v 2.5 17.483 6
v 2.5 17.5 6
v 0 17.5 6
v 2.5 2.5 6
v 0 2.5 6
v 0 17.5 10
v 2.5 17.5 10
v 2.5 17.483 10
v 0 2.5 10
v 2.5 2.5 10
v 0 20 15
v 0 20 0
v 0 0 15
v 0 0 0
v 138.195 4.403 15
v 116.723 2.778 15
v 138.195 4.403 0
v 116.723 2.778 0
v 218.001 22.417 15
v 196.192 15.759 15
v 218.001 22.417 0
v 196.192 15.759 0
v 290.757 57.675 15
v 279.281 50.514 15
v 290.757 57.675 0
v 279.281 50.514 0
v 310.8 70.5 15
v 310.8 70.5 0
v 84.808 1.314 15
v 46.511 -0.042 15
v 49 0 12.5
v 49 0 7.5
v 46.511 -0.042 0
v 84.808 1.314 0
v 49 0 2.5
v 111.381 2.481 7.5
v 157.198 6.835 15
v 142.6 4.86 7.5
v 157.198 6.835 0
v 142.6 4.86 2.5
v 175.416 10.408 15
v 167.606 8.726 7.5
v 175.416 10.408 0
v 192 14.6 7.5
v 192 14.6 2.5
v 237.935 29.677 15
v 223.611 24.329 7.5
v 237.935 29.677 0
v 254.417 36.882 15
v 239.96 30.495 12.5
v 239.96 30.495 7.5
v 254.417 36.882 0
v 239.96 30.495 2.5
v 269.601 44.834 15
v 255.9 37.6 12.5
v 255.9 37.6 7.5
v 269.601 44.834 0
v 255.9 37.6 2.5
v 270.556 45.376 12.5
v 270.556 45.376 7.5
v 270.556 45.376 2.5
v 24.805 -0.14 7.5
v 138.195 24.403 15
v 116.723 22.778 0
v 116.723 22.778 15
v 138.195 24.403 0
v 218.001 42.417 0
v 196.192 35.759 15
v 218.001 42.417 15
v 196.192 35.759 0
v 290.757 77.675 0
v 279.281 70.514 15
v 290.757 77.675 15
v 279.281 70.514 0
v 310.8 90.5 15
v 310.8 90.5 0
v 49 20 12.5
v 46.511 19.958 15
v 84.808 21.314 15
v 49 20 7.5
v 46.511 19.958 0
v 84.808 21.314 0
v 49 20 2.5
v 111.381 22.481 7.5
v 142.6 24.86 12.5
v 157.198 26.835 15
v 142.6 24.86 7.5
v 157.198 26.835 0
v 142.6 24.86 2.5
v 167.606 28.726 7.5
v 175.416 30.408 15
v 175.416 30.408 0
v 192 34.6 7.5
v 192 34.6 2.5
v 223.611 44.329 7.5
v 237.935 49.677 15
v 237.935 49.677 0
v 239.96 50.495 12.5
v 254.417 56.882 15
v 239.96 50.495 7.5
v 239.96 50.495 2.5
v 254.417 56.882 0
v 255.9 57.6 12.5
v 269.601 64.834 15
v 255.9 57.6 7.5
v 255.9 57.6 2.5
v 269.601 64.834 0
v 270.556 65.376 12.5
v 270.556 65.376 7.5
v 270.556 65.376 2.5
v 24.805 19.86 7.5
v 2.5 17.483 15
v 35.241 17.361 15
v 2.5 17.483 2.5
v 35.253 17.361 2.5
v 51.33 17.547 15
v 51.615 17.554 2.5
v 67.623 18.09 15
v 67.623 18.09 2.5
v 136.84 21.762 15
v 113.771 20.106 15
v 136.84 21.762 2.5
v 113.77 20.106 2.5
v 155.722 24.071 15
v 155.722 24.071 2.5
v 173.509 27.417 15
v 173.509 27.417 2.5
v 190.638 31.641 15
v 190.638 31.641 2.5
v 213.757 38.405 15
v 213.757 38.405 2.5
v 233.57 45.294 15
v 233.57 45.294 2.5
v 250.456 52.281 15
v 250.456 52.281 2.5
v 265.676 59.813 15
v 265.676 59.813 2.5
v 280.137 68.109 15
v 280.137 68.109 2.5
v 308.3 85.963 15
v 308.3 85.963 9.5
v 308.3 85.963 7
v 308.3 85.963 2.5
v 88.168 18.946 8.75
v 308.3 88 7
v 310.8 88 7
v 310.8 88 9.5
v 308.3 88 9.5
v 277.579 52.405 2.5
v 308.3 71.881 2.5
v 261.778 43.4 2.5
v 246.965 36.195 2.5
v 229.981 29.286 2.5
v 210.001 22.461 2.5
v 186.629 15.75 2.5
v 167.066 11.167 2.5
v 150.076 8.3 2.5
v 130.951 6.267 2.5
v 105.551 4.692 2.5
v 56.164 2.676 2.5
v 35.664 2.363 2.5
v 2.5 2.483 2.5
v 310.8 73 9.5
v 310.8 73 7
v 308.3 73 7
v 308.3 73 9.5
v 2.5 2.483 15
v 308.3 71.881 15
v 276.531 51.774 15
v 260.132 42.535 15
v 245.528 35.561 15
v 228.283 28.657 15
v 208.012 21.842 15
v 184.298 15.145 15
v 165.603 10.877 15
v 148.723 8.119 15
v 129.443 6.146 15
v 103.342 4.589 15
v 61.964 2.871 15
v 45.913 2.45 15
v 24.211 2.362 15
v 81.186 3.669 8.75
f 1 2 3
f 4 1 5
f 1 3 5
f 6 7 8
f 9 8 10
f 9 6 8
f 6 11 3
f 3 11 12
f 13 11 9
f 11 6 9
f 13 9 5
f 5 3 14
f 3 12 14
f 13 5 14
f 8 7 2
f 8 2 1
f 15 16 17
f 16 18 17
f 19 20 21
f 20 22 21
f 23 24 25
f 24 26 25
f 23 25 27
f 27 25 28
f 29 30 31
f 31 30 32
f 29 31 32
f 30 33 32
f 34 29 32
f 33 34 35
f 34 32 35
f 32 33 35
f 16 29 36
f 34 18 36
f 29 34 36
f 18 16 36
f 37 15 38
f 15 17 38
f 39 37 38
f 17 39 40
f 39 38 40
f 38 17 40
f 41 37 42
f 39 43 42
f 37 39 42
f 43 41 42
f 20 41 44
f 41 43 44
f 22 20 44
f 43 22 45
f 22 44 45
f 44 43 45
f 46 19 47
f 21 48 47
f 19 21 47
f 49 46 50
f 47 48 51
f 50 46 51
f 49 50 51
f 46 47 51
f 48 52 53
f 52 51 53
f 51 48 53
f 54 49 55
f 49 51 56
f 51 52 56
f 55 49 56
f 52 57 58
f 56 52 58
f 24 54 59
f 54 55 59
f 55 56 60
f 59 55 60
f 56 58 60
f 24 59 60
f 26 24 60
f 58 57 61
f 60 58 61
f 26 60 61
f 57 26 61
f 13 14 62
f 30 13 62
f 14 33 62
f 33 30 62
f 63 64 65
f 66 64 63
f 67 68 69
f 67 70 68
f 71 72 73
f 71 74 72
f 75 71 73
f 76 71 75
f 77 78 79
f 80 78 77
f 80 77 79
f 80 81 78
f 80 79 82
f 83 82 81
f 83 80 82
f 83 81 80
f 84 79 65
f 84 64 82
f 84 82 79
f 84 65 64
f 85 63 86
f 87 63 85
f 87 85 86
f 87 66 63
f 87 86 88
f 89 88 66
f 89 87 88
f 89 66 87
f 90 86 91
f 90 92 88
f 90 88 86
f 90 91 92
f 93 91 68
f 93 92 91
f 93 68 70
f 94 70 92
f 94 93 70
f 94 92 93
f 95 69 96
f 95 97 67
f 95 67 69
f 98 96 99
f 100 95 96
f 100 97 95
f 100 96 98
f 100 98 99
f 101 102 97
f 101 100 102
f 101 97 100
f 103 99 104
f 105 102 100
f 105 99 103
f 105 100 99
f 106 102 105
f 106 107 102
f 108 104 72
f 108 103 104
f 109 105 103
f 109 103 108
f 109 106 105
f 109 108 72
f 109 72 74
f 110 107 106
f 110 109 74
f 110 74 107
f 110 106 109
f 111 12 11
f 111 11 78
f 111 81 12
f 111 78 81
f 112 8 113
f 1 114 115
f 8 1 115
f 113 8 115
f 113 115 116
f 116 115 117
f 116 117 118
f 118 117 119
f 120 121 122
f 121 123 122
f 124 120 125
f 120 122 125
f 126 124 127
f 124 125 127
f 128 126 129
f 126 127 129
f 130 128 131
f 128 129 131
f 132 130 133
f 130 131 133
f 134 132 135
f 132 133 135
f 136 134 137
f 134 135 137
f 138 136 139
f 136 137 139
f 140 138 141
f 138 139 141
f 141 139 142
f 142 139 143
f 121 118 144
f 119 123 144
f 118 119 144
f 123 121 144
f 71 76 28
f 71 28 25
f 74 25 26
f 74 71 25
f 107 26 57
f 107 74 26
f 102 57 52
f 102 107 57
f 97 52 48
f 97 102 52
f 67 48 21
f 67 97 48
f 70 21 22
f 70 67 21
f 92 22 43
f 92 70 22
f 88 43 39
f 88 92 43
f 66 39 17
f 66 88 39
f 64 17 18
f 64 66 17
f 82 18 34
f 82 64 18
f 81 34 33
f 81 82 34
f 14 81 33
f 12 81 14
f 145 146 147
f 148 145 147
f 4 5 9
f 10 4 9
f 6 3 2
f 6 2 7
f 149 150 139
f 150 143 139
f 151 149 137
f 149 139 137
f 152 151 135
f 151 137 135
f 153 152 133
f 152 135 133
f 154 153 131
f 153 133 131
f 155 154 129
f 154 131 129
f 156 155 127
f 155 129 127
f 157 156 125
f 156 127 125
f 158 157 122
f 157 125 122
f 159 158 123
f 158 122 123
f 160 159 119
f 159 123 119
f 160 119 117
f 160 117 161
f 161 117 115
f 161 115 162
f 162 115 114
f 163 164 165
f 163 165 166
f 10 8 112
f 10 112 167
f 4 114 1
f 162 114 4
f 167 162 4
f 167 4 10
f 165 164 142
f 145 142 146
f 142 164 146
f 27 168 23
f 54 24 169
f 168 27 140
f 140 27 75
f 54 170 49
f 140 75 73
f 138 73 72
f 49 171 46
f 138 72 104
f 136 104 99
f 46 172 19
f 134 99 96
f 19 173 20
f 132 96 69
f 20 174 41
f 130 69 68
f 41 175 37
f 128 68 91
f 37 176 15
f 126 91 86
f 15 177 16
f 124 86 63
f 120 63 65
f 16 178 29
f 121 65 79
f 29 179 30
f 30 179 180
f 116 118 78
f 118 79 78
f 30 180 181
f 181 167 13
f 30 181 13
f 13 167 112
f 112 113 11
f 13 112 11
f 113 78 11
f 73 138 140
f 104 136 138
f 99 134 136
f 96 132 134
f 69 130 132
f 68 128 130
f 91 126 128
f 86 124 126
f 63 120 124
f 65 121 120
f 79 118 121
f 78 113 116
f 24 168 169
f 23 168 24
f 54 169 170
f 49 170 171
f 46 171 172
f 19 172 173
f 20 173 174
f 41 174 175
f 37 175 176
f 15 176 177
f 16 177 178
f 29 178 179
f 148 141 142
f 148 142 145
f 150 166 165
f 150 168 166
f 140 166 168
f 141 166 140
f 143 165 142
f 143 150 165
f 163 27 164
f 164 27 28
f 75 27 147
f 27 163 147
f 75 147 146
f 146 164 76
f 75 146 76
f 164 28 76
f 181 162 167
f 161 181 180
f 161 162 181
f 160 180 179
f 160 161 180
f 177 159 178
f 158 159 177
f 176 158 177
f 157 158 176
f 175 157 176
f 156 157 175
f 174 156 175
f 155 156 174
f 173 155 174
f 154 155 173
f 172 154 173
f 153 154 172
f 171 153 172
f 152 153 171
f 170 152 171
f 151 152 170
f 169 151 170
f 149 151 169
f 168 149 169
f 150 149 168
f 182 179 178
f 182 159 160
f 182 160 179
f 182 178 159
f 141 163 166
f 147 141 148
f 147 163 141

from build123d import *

# Parameters (mm, degrees)
F1_DEPTH = 15
F2_T     = -2.5
F3_W     = 15
F3_H     = 4
F4_DEPTH = 2.5
F5_W     = 15
F5_H     = 2.5
F6_DEPTH = 2.5


with BuildPart() as f1:
    # F0 (on Top) → F1 (new body)
    with BuildSketch(Plane.XY):
        with BuildLine():
            add(Edge.make_bspline(
                [(0, 20), (18.4547170081, 19.8746186243), (49.1586302486, 19.6363824376), (81.651485284, 21.3203627116), (144.6164509178, 23.4125982049), (191.7138925015, 33.5667046191), (257.8451763383, 54.7310576595), (293.6638137306, 79.7551524216), (310.8, 90.5)],
                knots=[0, 0, 0, 0, 0.159543607, 0.2905166174, 0.4681043654, 0.6298325102, 0.8176597752, 1, 1, 1, 1], degree=3))
            Line((0, 20), (0, 0))
            add(Edge.make_bspline(
                [(0, 0), (18.4547170081, -0.1253813757), (49.1586302486, -0.3636175624), (81.651485284, 1.3203627116), (144.6164509178, 3.4125982049), (191.7138925015, 13.5667046191), (257.8451763383, 34.7310576595), (293.6638137306, 59.7551524216), (310.8, 70.5)],
                knots=[0, 0, 0, 0, 0.159543607, 0.2905166174, 0.4681043654, 0.6298325102, 0.8176597752, 1, 1, 1, 1], degree=3))
            Line((310.8, 70.5), (310.8, 90.5))
        make_face()
    extrude(amount=F1_DEPTH)

    # F2
    f2_openings = [f1.faces().sort_by_distance(p)[0] for p in [
        (162.825516, 24.515519, 15),
    ]]
    offset(amount=F2_T, openings=f2_openings, kind=Kind.INTERSECTION)

    # F3 (on face) → F4 (cut, through all)
    with BuildSketch(Plane(origin=(0, 0, 0), x_dir=(0, -1, 0), z_dir=(-1, 0, 0))):
        with Locations((-10, 8)):
            Rectangle(F3_W, F3_H)
    extrude(amount=-F4_DEPTH, mode=Mode.SUBTRACT)

    # F5 (on face) → F6 (cut, through all)
    with BuildSketch(Plane.YZ.offset(310.8)):
        with Locations((80.5, 8.25)):
            Rectangle(F5_W, F5_H)
    extrude(amount=-F6_DEPTH, mode=Mode.SUBTRACT)


solid = f1.part
